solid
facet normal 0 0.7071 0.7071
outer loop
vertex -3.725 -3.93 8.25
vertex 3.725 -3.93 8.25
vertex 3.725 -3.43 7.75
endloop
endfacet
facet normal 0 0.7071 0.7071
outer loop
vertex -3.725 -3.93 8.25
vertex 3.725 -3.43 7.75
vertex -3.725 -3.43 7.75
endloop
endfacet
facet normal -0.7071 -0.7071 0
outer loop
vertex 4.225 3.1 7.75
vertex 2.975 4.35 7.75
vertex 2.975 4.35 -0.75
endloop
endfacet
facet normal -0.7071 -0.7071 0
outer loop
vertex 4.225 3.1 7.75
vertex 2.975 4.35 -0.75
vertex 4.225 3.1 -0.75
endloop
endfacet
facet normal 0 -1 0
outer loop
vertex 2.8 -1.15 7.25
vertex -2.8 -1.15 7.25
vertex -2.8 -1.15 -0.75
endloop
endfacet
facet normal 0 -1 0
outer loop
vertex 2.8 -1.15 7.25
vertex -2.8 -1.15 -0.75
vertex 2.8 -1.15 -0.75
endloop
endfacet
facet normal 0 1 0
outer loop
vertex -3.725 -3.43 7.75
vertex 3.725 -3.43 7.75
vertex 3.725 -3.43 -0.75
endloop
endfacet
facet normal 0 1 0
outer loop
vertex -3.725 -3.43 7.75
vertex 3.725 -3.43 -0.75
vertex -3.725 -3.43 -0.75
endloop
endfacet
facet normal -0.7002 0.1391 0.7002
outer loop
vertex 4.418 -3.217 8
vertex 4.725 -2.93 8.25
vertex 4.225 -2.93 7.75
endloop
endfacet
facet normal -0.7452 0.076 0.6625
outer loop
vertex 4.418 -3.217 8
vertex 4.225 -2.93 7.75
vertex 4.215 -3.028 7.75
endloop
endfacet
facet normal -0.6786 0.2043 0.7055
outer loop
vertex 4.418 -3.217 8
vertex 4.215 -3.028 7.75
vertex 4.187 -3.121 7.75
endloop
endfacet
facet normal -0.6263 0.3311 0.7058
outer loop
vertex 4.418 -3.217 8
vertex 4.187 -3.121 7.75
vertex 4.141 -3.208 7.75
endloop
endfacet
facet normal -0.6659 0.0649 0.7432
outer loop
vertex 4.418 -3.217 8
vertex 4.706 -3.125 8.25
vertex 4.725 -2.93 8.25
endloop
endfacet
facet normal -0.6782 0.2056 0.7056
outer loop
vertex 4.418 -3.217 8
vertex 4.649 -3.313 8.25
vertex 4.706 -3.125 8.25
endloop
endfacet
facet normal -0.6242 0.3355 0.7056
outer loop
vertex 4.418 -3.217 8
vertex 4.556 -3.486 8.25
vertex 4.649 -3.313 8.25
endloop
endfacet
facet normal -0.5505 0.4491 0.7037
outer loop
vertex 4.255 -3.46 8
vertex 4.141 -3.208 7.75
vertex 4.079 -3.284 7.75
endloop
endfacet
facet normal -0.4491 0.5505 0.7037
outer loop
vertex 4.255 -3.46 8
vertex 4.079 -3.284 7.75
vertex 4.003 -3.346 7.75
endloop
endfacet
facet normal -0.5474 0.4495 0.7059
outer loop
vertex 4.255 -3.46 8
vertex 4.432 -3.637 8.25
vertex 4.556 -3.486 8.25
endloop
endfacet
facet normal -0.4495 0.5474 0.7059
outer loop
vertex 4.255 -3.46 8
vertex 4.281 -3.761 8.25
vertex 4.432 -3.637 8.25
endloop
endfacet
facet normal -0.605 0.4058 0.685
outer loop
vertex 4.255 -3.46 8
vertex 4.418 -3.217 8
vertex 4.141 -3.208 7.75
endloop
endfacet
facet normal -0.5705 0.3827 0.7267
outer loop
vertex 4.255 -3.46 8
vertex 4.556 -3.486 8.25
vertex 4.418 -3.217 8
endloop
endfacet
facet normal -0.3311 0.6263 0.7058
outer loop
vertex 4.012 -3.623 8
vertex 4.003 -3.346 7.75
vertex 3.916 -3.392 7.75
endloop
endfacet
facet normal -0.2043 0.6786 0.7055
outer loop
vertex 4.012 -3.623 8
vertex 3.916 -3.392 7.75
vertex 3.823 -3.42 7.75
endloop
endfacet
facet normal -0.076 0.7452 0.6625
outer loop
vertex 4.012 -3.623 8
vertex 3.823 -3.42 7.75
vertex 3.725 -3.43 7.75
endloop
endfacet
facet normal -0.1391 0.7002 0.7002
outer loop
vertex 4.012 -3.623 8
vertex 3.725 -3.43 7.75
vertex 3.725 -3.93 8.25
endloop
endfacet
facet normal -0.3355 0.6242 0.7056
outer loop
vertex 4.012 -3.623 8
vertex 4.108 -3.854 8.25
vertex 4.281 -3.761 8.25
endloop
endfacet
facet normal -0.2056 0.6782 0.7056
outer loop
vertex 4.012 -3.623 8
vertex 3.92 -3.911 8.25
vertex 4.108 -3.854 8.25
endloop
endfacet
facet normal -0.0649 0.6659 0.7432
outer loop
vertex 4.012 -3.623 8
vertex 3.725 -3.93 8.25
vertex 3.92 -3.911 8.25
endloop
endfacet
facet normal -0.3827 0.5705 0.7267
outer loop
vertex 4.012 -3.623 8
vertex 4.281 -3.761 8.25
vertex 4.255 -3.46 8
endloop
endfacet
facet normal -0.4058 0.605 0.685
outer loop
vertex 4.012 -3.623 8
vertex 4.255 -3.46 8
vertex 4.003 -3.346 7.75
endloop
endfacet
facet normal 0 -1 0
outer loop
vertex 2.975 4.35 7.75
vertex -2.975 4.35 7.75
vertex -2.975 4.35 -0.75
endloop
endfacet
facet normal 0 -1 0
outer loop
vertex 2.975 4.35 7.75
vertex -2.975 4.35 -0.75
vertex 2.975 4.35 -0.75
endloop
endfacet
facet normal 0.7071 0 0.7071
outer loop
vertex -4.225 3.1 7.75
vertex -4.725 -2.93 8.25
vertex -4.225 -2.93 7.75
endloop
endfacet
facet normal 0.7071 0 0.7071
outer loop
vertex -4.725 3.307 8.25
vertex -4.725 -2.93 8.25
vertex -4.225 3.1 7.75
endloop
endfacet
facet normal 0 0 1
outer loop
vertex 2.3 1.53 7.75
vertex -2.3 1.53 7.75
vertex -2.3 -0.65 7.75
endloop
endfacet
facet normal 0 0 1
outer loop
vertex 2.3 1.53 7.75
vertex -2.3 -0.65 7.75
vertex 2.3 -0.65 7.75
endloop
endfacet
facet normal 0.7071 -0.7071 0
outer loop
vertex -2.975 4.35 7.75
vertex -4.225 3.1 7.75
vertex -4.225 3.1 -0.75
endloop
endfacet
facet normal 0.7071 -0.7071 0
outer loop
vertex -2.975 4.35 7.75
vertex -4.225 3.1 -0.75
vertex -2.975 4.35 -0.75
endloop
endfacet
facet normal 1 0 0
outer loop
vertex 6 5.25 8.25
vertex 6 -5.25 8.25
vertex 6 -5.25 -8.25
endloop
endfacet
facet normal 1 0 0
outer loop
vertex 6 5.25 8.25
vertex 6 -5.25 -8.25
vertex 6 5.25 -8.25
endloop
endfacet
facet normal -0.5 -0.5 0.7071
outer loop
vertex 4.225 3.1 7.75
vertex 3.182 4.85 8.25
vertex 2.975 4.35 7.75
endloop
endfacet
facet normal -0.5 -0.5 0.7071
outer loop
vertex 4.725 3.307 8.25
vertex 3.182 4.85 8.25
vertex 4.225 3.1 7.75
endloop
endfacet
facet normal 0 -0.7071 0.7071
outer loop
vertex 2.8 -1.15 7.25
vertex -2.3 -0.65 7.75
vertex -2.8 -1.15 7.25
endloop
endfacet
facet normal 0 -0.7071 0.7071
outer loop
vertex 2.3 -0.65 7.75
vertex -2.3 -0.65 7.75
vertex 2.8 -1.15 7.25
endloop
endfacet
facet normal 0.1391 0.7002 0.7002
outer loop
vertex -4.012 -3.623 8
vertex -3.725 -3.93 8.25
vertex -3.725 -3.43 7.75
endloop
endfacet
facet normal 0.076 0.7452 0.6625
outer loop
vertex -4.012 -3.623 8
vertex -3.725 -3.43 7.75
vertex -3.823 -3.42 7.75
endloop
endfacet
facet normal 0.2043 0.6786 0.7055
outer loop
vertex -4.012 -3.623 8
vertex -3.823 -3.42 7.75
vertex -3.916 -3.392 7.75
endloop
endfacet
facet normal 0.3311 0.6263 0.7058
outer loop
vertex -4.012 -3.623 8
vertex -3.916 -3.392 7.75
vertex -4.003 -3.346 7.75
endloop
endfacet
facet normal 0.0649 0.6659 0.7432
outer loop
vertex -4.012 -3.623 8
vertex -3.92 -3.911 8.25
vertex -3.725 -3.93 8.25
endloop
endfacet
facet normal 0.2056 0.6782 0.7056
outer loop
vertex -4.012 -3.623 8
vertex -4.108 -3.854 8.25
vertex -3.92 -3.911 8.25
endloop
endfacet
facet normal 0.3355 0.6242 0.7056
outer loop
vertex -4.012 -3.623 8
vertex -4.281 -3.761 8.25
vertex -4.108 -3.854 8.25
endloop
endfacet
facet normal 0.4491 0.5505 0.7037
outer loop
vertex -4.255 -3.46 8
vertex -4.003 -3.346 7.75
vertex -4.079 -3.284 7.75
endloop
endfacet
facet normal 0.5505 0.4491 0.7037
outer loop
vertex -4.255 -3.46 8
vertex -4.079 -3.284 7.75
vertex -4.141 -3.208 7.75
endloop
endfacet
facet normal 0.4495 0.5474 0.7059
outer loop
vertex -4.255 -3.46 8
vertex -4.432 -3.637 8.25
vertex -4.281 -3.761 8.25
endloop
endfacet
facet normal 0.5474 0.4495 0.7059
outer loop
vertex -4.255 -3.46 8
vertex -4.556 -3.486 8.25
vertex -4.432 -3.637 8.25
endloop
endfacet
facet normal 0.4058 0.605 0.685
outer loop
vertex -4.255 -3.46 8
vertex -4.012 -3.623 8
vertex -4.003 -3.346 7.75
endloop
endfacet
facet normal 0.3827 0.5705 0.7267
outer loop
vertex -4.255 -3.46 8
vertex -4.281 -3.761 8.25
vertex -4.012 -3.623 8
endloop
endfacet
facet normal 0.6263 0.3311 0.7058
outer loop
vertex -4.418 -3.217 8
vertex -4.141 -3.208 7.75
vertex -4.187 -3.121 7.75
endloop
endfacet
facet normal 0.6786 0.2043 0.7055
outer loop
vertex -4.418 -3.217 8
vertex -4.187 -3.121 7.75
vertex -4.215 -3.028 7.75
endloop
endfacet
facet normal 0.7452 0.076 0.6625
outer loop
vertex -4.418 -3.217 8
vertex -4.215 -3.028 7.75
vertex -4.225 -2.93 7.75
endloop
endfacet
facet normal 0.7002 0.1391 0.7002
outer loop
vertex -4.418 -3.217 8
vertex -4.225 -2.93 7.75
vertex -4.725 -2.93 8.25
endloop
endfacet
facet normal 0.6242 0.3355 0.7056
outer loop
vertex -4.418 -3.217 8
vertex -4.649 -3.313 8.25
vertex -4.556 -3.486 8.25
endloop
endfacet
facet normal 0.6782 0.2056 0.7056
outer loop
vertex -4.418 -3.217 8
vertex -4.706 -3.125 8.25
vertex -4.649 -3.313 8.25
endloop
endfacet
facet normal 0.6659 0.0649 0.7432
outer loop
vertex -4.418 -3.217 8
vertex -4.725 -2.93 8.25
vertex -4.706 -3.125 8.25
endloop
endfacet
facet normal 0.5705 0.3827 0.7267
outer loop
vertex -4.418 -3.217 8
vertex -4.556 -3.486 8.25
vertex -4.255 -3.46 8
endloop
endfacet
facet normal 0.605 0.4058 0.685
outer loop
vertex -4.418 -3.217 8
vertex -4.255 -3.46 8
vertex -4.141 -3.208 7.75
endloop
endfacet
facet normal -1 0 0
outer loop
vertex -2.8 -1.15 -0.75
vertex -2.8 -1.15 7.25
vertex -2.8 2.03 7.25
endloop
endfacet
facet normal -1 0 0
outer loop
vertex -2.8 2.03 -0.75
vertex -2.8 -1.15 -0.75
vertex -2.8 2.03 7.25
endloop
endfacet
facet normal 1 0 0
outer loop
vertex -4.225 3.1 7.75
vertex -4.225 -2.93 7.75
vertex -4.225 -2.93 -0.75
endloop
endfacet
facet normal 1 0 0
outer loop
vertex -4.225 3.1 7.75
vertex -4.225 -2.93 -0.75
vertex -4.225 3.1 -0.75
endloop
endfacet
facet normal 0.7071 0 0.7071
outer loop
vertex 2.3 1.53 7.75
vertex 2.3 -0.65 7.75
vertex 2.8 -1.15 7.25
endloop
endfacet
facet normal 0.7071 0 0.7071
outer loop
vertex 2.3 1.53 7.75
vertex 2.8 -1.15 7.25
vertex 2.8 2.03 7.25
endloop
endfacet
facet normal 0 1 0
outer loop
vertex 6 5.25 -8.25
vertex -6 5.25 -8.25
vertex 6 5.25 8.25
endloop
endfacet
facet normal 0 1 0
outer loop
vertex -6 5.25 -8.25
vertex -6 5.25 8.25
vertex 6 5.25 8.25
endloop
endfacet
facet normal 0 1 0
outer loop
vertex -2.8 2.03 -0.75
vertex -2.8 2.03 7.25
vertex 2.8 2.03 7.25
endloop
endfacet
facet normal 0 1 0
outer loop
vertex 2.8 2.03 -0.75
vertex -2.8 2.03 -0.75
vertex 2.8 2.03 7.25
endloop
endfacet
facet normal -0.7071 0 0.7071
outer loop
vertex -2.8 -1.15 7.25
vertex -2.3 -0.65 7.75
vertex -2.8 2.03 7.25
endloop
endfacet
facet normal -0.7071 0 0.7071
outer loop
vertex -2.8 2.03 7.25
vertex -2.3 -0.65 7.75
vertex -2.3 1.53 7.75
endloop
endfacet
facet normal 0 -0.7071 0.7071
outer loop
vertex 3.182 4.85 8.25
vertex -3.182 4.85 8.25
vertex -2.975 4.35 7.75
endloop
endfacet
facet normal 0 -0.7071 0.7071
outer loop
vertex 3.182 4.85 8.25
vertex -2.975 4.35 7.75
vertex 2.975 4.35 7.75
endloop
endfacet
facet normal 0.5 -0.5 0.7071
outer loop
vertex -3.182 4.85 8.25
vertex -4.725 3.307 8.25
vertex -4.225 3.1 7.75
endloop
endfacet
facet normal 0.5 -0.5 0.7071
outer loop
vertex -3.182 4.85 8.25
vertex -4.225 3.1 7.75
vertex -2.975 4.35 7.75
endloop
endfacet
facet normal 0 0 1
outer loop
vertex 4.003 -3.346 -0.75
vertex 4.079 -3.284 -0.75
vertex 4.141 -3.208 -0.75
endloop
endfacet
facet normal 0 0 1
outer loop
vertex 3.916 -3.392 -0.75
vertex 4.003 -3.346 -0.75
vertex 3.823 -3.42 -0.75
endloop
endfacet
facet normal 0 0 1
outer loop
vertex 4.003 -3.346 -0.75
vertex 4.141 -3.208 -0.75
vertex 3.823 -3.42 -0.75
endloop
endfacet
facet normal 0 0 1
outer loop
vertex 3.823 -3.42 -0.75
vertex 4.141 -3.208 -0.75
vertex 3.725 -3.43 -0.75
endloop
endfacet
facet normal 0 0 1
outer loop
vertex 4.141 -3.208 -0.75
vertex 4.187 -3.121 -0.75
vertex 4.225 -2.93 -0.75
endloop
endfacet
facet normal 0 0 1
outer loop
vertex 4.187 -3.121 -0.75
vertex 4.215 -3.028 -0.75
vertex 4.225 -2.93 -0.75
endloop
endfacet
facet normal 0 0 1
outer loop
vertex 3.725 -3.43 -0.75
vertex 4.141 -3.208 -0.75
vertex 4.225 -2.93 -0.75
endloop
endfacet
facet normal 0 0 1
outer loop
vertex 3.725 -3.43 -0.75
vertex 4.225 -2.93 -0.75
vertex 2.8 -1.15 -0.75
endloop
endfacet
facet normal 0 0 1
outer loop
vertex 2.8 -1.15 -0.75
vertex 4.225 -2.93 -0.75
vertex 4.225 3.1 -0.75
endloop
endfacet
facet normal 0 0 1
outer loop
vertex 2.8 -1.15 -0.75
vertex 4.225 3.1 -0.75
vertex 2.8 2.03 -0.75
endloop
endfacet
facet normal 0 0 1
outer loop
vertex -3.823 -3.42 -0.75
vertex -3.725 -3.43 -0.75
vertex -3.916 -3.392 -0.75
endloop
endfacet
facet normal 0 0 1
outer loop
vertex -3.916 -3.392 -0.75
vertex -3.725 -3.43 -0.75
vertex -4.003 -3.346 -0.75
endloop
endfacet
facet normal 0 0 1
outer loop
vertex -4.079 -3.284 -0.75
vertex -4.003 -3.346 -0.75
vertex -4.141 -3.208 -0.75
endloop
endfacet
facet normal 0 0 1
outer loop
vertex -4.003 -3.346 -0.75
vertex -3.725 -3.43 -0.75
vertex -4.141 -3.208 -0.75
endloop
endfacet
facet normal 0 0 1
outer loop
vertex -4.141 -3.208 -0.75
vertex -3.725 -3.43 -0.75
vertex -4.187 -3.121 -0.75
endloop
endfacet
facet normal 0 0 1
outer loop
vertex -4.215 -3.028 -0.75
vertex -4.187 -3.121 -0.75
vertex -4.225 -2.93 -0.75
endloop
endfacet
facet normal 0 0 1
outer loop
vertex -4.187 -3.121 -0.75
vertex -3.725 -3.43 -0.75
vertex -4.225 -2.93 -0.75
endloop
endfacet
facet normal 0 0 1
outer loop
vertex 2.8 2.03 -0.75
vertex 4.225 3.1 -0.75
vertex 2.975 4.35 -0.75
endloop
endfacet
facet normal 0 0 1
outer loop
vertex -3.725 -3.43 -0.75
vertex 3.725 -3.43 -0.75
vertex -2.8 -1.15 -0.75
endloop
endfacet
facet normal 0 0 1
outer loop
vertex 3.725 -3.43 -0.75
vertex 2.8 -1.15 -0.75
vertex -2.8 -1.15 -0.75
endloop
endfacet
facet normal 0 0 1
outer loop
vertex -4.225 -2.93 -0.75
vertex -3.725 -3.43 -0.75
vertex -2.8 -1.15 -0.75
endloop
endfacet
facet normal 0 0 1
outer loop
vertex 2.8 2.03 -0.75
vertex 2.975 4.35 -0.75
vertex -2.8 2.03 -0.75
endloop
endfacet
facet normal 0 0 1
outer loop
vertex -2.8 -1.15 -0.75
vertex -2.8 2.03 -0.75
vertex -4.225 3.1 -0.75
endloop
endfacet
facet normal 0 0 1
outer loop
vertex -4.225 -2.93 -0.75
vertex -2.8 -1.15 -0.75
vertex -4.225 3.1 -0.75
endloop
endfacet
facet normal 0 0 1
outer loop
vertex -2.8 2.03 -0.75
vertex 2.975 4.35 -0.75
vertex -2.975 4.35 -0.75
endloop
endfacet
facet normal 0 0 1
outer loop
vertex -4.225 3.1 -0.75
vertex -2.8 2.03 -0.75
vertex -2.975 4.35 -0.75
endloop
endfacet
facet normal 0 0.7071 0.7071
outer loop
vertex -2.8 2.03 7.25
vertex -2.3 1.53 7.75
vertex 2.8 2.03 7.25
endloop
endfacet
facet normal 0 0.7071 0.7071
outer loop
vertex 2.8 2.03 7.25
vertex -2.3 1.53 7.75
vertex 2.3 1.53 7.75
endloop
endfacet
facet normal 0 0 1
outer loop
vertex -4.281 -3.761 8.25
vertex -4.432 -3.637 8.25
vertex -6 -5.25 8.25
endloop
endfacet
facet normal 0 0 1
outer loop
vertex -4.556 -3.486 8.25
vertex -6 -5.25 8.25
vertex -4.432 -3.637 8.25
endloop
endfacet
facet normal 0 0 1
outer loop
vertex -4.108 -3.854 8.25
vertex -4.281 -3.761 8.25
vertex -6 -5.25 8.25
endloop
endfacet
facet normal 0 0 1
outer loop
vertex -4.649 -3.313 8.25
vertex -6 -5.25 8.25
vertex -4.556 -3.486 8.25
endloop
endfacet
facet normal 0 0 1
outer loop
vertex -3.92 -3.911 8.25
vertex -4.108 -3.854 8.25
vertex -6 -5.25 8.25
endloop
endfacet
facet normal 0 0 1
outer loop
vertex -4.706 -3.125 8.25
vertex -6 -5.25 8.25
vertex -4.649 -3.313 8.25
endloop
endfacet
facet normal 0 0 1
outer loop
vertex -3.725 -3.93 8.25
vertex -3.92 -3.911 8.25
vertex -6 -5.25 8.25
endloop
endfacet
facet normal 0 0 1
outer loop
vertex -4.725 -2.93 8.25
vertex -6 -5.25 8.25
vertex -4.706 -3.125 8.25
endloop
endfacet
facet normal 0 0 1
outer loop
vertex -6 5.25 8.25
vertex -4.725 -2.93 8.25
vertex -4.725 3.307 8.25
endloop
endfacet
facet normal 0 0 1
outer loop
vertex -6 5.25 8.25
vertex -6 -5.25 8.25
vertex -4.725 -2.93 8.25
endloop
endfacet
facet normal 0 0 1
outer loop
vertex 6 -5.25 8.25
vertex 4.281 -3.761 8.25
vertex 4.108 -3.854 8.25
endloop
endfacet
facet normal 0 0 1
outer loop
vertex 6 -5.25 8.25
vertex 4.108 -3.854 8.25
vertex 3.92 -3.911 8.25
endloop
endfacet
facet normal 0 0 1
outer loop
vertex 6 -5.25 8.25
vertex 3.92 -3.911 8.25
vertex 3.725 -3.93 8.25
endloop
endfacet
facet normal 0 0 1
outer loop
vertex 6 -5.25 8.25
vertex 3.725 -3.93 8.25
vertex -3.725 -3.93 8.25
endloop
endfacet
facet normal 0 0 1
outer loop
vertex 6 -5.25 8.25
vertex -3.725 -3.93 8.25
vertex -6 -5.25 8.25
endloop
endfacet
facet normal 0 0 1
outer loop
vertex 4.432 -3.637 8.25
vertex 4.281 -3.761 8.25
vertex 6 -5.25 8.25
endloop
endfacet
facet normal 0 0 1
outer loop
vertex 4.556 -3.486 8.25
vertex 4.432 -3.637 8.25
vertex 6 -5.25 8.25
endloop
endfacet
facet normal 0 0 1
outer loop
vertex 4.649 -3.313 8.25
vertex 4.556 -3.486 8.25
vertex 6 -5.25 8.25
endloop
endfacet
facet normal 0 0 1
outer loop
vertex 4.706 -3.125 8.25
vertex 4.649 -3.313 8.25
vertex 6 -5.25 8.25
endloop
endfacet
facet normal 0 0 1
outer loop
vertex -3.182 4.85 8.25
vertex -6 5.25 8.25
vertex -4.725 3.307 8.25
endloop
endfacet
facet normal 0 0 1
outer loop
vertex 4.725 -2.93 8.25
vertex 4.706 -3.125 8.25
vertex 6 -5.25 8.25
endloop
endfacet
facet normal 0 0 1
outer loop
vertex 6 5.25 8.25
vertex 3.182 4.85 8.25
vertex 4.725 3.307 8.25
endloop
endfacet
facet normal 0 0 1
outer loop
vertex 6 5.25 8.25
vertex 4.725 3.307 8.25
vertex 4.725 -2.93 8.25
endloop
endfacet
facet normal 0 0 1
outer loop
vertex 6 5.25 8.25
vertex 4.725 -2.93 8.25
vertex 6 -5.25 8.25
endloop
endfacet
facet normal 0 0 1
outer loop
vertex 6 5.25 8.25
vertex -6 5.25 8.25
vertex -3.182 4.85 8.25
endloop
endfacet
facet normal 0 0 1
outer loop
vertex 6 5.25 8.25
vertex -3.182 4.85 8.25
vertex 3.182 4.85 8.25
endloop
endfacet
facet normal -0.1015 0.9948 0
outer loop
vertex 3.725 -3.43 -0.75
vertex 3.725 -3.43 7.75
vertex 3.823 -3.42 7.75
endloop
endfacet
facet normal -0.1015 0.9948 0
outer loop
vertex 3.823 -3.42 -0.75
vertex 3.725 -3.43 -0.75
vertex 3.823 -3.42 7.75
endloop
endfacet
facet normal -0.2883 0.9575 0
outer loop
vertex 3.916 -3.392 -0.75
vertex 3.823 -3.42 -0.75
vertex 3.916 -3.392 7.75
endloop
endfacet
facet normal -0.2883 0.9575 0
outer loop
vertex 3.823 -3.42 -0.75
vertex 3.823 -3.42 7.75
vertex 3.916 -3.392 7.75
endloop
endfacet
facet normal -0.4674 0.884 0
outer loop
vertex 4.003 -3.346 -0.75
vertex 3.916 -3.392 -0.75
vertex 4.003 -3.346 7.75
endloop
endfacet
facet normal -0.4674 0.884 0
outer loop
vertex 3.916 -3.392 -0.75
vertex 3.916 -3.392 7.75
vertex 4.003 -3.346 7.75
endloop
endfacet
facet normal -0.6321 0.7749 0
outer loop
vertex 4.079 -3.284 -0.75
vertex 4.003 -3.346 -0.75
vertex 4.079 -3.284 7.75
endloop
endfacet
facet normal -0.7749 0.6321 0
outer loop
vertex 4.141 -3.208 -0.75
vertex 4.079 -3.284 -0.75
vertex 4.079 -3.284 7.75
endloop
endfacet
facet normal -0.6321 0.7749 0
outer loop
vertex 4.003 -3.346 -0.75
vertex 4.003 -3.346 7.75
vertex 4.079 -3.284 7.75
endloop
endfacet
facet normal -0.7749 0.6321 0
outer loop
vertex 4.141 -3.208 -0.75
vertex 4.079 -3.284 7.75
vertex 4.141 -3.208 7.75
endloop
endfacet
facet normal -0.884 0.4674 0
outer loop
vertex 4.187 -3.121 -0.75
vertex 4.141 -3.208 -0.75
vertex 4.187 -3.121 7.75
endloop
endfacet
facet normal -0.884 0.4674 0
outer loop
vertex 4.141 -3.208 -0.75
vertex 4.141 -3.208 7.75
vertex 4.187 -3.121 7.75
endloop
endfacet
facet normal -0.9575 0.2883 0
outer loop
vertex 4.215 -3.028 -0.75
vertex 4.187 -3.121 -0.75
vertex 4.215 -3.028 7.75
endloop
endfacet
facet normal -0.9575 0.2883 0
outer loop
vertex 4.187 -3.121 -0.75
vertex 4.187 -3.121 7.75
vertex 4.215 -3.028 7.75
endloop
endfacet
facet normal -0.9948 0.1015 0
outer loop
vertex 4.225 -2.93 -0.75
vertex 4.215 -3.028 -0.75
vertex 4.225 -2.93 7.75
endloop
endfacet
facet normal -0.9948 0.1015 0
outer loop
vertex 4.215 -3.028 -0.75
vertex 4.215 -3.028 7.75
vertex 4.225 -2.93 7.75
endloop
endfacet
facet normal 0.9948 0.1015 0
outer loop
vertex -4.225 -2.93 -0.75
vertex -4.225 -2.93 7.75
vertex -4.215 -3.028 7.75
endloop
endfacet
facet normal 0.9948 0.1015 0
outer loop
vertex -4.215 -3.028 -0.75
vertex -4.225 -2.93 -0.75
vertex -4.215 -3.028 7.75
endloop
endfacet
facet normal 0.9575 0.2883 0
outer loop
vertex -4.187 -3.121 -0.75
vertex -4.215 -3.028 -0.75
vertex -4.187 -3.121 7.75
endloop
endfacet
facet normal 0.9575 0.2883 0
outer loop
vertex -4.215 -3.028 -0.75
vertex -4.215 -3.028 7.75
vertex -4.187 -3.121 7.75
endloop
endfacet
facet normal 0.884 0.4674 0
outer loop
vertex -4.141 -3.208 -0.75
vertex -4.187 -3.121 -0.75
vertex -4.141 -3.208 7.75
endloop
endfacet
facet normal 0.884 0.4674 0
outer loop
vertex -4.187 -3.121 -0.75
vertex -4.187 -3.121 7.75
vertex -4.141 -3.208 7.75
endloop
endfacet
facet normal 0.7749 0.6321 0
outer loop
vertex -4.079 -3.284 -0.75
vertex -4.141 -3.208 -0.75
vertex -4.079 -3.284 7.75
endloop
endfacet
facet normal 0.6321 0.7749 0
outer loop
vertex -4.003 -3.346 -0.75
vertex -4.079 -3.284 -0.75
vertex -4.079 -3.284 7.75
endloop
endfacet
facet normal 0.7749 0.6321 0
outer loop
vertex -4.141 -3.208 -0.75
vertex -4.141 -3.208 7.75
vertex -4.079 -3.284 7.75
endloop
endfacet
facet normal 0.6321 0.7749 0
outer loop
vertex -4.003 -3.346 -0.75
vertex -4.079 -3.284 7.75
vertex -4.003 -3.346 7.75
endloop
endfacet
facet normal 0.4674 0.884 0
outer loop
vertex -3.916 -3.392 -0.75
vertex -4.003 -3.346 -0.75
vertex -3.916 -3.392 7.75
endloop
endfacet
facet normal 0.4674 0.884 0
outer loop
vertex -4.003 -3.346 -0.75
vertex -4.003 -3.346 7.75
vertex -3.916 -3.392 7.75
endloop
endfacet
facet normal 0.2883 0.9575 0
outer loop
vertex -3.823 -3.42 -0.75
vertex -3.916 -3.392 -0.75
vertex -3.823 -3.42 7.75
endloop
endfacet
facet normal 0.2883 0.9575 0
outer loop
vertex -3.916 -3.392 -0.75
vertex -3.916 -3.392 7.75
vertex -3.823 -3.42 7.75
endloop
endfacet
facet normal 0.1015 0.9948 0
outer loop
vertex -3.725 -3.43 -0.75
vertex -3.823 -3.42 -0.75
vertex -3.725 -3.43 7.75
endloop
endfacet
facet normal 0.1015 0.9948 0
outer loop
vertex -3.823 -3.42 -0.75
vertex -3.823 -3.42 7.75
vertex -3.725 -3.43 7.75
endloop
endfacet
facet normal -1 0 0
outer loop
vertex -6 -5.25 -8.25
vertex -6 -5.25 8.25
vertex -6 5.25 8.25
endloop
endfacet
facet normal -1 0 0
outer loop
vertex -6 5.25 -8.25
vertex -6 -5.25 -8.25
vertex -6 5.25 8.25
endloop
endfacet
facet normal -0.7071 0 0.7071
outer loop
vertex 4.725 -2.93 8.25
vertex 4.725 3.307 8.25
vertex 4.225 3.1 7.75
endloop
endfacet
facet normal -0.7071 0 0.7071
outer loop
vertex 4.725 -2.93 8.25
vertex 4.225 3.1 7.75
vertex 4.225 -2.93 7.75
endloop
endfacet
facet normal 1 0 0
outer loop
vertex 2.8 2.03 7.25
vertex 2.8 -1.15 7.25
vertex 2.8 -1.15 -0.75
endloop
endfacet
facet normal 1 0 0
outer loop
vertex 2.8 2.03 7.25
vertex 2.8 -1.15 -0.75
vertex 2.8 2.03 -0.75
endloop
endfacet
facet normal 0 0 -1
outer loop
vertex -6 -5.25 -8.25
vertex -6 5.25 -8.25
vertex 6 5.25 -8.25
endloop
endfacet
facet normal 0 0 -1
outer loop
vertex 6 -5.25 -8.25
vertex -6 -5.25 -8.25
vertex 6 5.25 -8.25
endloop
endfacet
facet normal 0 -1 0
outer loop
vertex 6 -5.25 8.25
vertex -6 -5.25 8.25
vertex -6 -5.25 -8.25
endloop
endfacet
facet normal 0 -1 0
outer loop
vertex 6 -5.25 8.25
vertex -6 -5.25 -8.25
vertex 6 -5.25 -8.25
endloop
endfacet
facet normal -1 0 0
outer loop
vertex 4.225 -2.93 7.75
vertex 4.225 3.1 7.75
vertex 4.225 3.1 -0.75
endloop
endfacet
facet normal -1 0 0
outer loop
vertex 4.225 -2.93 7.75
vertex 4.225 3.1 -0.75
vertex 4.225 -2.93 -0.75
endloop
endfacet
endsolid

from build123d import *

# Parameters (mm, degrees)
SKETCH_W        = 12
SKETCH_H        = 10.5
PAD_DEPTH       = 8.25
POCKET_DEPTH    = 9
SKETCH002_W     = 5.6
SKETCH002_H     = 3.18
PAD001_DEPTH    = 8.5
CHAMFER_SIZE    = 0.5
CHAMFER001_SIZE = 0.5


with BuildPart() as part:
    # Sketch → Pad (new body, symmetric)
    with BuildSketch(Plane.XY):
        Rectangle(SKETCH_W, SKETCH_H)
    extrude(amount=PAD_DEPTH, both=True)

    # Sketch001 → Pocket (cut)
    with BuildSketch(Plane.XY.offset(8.25)):
        with BuildLine():
            Line((-4.225, -2.93), (-4.225, 3.1))
            Line((-4.225, 3.1), (-2.975, 4.35))
            Line((-2.975, 4.35), (2.975, 4.35))
            Line((2.975, 4.35), (4.225, 3.1))
            Line((4.225, 3.1), (4.225, -2.93))
            ThreePointArc((3.725, -3.43), (4.078553, -3.283553), (4.225, -2.93))
            Line((3.725, -3.43), (-3.725, -3.43))
            ThreePointArc((-4.225, -2.93), (-4.078553, -3.283553), (-3.725, -3.43))
        make_face()
    extrude(amount=-POCKET_DEPTH, mode=Mode.SUBTRACT)

    # Sketch002 → Pad001 (new body)
    with BuildSketch(Plane.XY.offset(-0.75)):
        with Locations((0, 0.44)):
            Rectangle(SKETCH002_W, SKETCH002_H)
    extrude(amount=PAD001_DEPTH)

    # Chamfer
    chamfer_edges = [part.edges().sort_by_distance(p)[0] for p in [
        (2.8, 0.44, 7.75),
        (0, 2.03, 7.75),
        (-2.8, 0.44, 7.75),
        (0, -1.15, 7.75),
    ]]
    chamfer(chamfer_edges, length=CHAMFER_SIZE)

    # Chamfer001
    chamfer001_edges = [part.edges().sort_by_distance(p)[0] for p in [
        (0, -3.43, 8.25),
        (4.078553, -3.283553, 8.25),
        (-4.078553, -3.283553, 8.25),
        (4.225, 0.085, 8.25),
        (-4.225, 0.085, 8.25),
        (3.6, 3.725, 8.25),
        (-3.6, 3.725, 8.25),
        (0, 4.35, 8.25),
    ]]
    chamfer(chamfer001_edges, length=CHAMFER001_SIZE)


solid = part.part
